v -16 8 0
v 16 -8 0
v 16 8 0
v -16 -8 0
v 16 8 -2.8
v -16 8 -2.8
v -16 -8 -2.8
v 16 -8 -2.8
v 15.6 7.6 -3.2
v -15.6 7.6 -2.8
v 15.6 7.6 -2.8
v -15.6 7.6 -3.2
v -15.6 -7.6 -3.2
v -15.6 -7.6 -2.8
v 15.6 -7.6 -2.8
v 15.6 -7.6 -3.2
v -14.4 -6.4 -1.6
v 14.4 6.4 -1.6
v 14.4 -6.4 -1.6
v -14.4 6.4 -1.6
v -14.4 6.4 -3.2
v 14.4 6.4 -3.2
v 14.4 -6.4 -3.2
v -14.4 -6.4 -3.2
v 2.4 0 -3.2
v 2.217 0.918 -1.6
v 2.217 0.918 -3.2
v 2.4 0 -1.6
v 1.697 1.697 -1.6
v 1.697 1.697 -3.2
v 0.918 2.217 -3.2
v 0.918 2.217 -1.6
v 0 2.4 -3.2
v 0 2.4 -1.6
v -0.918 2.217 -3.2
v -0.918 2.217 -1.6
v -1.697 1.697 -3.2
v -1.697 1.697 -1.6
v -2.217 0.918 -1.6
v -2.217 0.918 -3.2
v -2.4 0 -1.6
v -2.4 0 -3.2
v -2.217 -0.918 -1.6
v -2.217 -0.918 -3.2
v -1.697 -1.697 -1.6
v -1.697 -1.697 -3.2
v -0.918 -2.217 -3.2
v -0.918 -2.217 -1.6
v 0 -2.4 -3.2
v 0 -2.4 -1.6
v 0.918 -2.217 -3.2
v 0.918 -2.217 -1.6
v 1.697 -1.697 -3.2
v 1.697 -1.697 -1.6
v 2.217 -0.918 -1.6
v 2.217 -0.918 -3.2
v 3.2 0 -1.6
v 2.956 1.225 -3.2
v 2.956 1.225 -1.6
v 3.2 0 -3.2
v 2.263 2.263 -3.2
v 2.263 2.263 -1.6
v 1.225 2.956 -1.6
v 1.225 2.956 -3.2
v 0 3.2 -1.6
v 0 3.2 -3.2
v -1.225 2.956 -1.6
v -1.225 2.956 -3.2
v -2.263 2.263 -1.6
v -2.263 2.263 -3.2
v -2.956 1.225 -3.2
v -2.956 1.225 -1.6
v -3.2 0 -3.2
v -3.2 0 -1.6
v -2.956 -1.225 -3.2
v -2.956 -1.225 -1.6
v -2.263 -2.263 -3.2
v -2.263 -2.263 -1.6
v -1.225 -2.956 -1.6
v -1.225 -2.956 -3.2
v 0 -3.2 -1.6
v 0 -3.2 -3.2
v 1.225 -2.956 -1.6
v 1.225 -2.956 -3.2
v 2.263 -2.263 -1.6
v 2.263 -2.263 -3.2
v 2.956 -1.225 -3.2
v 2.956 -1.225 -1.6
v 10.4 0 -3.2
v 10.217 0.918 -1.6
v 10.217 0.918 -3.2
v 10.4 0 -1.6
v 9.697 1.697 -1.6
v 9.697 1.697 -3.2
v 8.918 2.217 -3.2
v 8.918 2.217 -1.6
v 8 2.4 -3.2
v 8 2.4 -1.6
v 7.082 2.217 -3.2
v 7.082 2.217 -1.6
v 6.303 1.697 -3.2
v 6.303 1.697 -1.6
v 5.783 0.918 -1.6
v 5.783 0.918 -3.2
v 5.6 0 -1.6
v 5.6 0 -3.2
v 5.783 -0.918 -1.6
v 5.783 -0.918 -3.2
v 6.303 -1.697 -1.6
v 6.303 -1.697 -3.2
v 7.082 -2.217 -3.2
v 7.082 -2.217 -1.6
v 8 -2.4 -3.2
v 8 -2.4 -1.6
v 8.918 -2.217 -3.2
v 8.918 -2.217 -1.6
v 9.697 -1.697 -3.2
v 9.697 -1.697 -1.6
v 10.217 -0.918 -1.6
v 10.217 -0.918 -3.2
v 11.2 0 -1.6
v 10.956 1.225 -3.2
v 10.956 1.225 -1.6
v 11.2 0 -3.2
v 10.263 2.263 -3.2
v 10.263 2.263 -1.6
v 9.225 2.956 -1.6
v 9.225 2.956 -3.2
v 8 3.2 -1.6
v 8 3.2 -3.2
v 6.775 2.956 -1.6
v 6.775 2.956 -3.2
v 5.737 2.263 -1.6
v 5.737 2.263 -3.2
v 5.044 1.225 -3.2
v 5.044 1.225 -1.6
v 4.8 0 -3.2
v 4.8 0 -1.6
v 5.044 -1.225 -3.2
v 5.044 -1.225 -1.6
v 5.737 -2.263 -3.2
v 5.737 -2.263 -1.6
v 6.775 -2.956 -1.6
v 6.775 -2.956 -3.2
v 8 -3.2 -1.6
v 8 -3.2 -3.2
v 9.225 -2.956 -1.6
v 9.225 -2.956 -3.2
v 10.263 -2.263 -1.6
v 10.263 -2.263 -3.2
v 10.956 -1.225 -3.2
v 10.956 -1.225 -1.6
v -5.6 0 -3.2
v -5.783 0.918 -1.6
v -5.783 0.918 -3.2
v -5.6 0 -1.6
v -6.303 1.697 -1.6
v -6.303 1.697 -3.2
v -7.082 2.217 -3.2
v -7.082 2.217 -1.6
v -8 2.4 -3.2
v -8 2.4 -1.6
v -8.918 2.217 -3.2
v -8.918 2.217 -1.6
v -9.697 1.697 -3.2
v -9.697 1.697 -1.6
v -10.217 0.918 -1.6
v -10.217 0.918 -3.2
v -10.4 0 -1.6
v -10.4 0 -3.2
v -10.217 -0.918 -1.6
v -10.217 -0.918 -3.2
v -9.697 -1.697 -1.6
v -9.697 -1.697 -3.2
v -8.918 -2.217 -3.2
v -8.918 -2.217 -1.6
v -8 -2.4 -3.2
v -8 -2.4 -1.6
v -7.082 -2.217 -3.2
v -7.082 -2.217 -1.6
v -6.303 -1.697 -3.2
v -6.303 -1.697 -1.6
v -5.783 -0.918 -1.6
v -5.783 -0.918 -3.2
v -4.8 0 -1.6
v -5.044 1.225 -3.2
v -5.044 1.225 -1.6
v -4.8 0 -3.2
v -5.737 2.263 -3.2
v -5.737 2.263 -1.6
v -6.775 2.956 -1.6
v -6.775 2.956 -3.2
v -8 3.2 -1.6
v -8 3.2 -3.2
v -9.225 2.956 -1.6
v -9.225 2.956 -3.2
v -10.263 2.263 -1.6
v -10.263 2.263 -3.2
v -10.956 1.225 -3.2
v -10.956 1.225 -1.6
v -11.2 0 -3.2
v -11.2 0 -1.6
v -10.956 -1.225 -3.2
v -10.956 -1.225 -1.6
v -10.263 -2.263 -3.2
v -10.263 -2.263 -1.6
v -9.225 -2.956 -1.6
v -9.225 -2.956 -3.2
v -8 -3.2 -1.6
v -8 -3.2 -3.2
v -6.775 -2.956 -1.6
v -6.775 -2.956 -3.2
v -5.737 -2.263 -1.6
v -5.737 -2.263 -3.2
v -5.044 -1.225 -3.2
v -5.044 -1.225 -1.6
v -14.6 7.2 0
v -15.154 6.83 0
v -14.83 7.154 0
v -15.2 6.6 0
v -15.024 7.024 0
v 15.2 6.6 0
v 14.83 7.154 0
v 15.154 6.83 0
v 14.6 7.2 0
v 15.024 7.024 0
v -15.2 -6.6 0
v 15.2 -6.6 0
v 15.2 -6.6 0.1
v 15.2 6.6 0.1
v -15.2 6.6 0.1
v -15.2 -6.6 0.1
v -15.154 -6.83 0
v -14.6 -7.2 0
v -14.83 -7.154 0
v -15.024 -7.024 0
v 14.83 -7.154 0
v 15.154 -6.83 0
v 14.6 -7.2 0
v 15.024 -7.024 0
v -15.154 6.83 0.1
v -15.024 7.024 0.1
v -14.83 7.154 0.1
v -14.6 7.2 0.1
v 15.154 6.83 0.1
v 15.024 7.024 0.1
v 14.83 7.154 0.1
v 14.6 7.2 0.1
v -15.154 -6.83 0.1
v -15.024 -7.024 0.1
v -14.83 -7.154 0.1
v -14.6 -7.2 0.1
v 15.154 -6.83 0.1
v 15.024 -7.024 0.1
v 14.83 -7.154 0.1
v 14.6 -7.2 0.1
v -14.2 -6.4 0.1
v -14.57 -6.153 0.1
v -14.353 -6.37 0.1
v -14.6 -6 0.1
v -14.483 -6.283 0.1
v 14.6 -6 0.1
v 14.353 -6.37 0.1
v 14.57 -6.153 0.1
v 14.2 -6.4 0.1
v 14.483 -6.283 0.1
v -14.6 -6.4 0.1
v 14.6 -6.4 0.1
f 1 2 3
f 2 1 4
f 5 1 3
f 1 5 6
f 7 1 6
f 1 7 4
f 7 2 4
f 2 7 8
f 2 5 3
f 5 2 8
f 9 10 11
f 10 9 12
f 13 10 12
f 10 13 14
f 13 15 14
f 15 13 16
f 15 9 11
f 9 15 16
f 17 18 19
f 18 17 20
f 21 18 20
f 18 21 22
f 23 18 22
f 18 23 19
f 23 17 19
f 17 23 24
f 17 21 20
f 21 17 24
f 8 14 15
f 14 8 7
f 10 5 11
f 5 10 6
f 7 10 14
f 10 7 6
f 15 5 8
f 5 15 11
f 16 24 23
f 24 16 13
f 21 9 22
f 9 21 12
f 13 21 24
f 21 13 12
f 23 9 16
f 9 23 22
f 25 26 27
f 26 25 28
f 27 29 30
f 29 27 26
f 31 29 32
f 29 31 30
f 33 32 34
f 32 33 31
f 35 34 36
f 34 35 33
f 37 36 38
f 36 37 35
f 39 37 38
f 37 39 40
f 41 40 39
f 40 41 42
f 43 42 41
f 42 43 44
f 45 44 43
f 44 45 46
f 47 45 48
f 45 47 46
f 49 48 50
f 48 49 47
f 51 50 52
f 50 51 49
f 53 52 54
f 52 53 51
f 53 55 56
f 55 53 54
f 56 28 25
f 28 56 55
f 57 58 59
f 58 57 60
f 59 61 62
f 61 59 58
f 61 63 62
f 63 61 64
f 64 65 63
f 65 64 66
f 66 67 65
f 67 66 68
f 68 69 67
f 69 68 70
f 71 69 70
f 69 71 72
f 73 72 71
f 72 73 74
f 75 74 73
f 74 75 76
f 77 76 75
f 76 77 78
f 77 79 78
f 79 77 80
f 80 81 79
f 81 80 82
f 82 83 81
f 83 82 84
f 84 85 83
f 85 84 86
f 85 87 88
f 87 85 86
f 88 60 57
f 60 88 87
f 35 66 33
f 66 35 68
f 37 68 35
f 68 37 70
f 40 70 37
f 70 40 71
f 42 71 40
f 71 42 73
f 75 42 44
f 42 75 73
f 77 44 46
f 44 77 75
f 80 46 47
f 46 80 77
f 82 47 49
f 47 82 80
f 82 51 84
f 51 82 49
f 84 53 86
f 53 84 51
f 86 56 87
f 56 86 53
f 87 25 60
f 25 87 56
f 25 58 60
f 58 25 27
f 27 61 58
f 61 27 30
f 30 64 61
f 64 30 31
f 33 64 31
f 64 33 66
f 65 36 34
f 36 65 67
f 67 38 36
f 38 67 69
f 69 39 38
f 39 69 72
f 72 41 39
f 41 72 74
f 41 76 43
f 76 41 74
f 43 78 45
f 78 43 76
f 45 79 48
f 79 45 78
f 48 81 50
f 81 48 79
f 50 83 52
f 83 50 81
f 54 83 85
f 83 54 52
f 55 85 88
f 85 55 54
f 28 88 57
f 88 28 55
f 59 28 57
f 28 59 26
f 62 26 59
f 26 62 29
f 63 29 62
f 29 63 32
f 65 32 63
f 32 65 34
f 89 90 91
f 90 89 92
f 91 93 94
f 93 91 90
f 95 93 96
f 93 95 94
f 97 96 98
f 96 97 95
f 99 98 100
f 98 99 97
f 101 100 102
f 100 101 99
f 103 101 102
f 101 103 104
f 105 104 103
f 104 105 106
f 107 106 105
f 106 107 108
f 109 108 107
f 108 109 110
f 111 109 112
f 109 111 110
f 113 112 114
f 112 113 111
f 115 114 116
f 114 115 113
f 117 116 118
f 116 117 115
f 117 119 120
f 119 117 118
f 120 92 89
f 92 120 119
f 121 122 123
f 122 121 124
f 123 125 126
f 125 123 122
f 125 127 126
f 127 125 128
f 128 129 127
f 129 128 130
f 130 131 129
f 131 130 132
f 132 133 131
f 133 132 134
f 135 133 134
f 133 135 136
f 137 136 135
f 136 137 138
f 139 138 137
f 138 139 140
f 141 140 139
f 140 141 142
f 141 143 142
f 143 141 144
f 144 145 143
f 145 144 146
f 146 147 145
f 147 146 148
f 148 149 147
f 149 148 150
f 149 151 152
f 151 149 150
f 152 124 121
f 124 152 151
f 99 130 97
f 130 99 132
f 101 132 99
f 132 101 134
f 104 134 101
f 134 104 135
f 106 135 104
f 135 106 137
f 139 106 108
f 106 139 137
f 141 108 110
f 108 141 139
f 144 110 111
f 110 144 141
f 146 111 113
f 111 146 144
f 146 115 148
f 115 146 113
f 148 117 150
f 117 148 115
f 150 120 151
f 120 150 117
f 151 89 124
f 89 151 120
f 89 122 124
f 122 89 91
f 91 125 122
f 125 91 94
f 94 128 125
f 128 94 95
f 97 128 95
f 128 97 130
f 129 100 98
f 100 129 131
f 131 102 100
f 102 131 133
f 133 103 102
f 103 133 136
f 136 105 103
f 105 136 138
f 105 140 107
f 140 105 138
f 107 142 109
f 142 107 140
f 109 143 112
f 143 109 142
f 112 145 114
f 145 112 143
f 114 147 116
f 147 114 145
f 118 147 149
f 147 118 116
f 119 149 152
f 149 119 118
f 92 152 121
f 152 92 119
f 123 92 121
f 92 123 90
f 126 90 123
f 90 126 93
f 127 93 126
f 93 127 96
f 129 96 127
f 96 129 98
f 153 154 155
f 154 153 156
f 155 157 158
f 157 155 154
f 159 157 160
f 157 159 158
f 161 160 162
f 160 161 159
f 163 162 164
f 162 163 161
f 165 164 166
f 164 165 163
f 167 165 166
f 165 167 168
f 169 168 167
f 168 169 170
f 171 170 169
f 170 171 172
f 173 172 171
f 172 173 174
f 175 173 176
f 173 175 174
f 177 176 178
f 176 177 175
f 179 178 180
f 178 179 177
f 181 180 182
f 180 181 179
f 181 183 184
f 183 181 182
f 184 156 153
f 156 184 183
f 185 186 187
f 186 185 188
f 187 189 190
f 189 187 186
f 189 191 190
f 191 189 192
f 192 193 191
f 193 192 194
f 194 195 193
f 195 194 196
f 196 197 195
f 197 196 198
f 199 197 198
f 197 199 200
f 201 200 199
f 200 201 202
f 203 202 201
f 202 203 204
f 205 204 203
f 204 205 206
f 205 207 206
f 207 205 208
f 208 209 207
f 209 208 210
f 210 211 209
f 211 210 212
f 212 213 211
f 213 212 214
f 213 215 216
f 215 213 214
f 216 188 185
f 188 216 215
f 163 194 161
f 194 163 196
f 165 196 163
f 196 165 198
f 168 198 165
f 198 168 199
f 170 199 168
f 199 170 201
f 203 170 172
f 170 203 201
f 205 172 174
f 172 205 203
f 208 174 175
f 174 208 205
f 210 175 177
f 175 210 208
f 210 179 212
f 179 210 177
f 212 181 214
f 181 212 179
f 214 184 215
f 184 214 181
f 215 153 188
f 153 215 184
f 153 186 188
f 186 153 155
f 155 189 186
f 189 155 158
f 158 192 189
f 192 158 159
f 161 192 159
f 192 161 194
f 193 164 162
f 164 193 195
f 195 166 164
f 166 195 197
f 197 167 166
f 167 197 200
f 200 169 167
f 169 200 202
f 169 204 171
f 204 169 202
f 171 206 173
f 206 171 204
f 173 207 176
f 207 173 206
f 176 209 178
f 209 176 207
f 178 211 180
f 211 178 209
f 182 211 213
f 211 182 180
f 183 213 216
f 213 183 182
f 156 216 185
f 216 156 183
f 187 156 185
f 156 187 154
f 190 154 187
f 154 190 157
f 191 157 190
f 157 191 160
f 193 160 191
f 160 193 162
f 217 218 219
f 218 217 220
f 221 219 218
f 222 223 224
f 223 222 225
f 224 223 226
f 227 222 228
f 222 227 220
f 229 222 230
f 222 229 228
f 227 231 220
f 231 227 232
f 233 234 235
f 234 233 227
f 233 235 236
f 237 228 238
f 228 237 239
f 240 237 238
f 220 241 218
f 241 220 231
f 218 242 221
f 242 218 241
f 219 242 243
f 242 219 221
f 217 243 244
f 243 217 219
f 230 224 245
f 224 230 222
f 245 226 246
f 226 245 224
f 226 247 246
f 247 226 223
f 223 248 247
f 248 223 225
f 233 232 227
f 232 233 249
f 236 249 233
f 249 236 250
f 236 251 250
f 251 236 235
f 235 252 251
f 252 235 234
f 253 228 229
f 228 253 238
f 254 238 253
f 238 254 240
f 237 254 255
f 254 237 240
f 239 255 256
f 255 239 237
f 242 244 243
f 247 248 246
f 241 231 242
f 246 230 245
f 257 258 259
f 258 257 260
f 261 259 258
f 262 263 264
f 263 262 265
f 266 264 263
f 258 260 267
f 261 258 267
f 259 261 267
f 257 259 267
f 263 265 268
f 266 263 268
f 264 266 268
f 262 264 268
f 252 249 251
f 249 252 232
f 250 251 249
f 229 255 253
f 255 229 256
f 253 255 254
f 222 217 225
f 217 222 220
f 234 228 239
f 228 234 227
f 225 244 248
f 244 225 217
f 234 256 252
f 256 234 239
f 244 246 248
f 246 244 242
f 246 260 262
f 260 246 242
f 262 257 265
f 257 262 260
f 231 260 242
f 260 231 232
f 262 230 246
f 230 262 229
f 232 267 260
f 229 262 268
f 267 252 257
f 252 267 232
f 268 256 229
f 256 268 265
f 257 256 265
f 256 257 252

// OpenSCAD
// file: ../p/4-4ring3.scad
use <../lib.scad>
$fa=1; $fs=0.2;
function ldraw_lib__4_4ring3(realsolid=false) = [
// 0 Ring  3 x 1.0
// 0 Name: 4-4ring3.dat
// 0 Author: James Jessiman
// 0 !LDRAW_ORG Primitive UPDATE 2009-01
// 0 !LICENSE Licensed under CC BY 2.0 and CC BY 4.0 : see CAreadme.txt
// 
// 0 BFC CERTIFY CCW
  [0,"BFC","CERTIFY"],
  [0,"BFC","CCW"],
// 
// 0 !HISTORY 1998-12-15 [PTadmin] Official Update 1998-10
// 0 !HISTORY 2002-04-05 [hafhead] Added BFC statement
// 0 !HISTORY 2002-04-25 [PTadmin] Official Update 2002-02
// 0 !HISTORY 2007-06-24 [PTadmin] Header formatted for Contributor Agreement
// 0 !HISTORY 2008-07-01 [PTadmin] Official Update 2008-01
// 0 !HISTORY 2008-08-26 [cwdee] Switch polygon winding and rename
// 0 !HISTORY 2009-05-02 [PTadmin] Official Update 2009-01
// 
// 
// 4 16 -1.5308 0 3.6956 -1.1481 0 2.7717 0 0 3 0 0 4
  [4,16,-1.5308,0,3.6956,-1.1481,0,2.7717,0,0,3,0,0,4],
// 4 16 -2.8284 0 2.8284 -2.1213 0 2.1213 -1.1481 0 2.7717 -1.5308 0 3.6956
  [4,16,-2.8284,0,2.8284,-2.1213,0,2.1213,-1.1481,0,2.7717,-1.5308,0,3.6956],
// 4 16 -3.6956 0 1.5308 -2.7717 0 1.1481 -2.1213 0 2.1213 -2.8284 0 2.8284
  [4,16,-3.6956,0,1.5308,-2.7717,0,1.1481,-2.1213,0,2.1213,-2.8284,0,2.8284],
// 4 16 -4 0 0 -3 0 0 -2.7717 0 1.1481 -3.6956 0 1.5308
  [4,16,-4,0,0,-3,0,0,-2.7717,0,1.1481,-3.6956,0,1.5308],
// 4 16 -3.6956 0 -1.5308 -2.7717 0 -1.1481 -3 0 0 -4 0 0
  [4,16,-3.6956,0,-1.5308,-2.7717,0,-1.1481,-3,0,0,-4,0,0],
// 4 16 -2.8284 0 -2.8284 -2.1213 0 -2.1213 -2.7717 0 -1.1481 -3.6956 0 -1.5308
  [4,16,-2.8284,0,-2.8284,-2.1213,0,-2.1213,-2.7717,0,-1.1481,-3.6956,0,-1.5308],
// 4 16 -1.5308 0 -3.6956 -1.1481 0 -2.7717 -2.1213 0 -2.1213 -2.8284 0 -2.8284
  [4,16,-1.5308,0,-3.6956,-1.1481,0,-2.7717,-2.1213,0,-2.1213,-2.8284,0,-2.8284],
// 4 16 0 0 -4 0 0 -3 -1.1481 0 -2.7717 -1.5308 0 -3.6956
  [4,16,0,0,-4,0,0,-3,-1.1481,0,-2.7717,-1.5308,0,-3.6956],
// 4 16 1.5308 0 -3.6956 1.1481 0 -2.7717 0 0 -3 0 0 -4
  [4,16,1.5308,0,-3.6956,1.1481,0,-2.7717,0,0,-3,0,0,-4],
// 4 16 2.8284 0 -2.8284 2.1213 0 -2.1213 1.1481 0 -2.7717 1.5308 0 -3.6956
  [4,16,2.8284,0,-2.8284,2.1213,0,-2.1213,1.1481,0,-2.7717,1.5308,0,-3.6956],
// 4 16 3.6956 0 -1.5308 2.7717 0 -1.1481 2.1213 0 -2.1213 2.8284 0 -2.8284
  [4,16,3.6956,0,-1.5308,2.7717,0,-1.1481,2.1213,0,-2.1213,2.8284,0,-2.8284],
// 4 16 4 0 0 3 0 0 2.7717 0 -1.1481 3.6956 0 -1.5308
  [4,16,4,0,0,3,0,0,2.7717,0,-1.1481,3.6956,0,-1.5308],
// 4 16 3.6956 0 1.5308 2.7717 0 1.1481 3 0 0 4 0 0
  [4,16,3.6956,0,1.5308,2.7717,0,1.1481,3,0,0,4,0,0],
// 4 16 2.8284 0 2.8284 2.1213 0 2.1213 2.7717 0 1.1481 3.6956 0 1.5308
  [4,16,2.8284,0,2.8284,2.1213,0,2.1213,2.7717,0,1.1481,3.6956,0,1.5308],
// 4 16 1.5308 0 3.6956 1.1481 0 2.7717 2.1213 0 2.1213 2.8284 0 2.8284
  [4,16,1.5308,0,3.6956,1.1481,0,2.7717,2.1213,0,2.1213,2.8284,0,2.8284],
// 4 16 0 0 4 0 0 3 1.1481 0 2.7717 1.5308 0 3.6956
  [4,16,0,0,4,0,0,3,1.1481,0,2.7717,1.5308,0,3.6956],
// 0
];
module ldraw_lib__4_4ring3(step=0, col=false, unit=2/5, alt=false, line=0.2, solid=!$preview)
    makepoly(ldraw_lib__4_4ring3(solid), step=step, col=col, unit=unit, alt=alt, line=line, solid=solid);
ldraw_lib__4_4ring3(line=0.2);
// file: ../p/4-4edge.scad
use <../lib.scad>
function ldraw_lib__4_4edge() = [
// 0 Circle 1.0
// 0 Name: 4-4edge.dat
// 0 Author: James Jessiman
// 0 !LDRAW_ORG Primitive UPDATE 2017-01
// 0 !LICENSE Licensed under CC BY 2.0 and CC BY 4.0 : see CAreadme.txt
// 
// 0 BFC CERTIFY CCW
  [0,"BFC","CERTIFY"],
  [0,"BFC","CCW"],
// 
// 0 !HISTORY 1998-12-15 [PTadmin] Official Update 1998-10
// 0 !HISTORY 2005-12-28 [PTadmin] Official Update 2005-01
// 0 !HISTORY 2007-06-24 [PTadmin] Header formatted for Contributor Agreement
// 0 !HISTORY 2008-07-01 [PTadmin] Official Update 2008-01
// 0 !HISTORY 2017-01-15 [Steffen] BFCed
// 0 !HISTORY 2017-12-30 [PTadmin] Official Update 2017-01
// 
// 
// 2 24 1 0 0 0.9239 0 0.3827
  [2,24,1,0,0,0.9239,0,0.3827],
// 2 24 0.9239 0 0.3827 0.7071 0 0.7071
  [2,24,0.9239,0,0.3827,0.7071,0,0.7071],
// 2 24 0.7071 0 0.7071 0.3827 0 0.9239
  [2,24,0.7071,0,0.7071,0.3827,0,0.9239],
// 2 24 0.3827 0 0.9239 0 0 1
  [2,24,0.3827,0,0.9239,0,0,1],
// 2 24 0 0 1 -0.3827 0 0.9239
  [2,24,0,0,1,-0.3827,0,0.9239],
// 2 24 -0.3827 0 0.9239 -0.7071 0 0.7071
  [2,24,-0.3827,0,0.9239,-0.7071,0,0.7071],
// 2 24 -0.7071 0 0.7071 -0.9239 0 0.3827
  [2,24,-0.7071,0,0.7071,-0.9239,0,0.3827],
// 2 24 -0.9239 0 0.3827 -1 0 -0
  [2,24,-0.9239,0,0.3827,-1,0,-0],
// 2 24 -1 0 -0 -0.9239 0 -0.3827
  [2,24,-1,0,-0,-0.9239,0,-0.3827],
// 2 24 -0.9239 0 -0.3827 -0.7071 0 -0.7071
  [2,24,-0.9239,0,-0.3827,-0.7071,0,-0.7071],
// 2 24 -0.7071 0 -0.7071 -0.3827 0 -0.9239
  [2,24,-0.7071,0,-0.7071,-0.3827,0,-0.9239],
// 2 24 -0.3827 0 -0.9239 0 0 -1
  [2,24,-0.3827,0,-0.9239,0,0,-1],
// 2 24 0 0 -1 0.3827 0 -0.9239
  [2,24,0,0,-1,0.3827,0,-0.9239],
// 2 24 0.3827 0 -0.9239 0.7071 0 -0.7071
  [2,24,0.3827,0,-0.9239,0.7071,0,-0.7071],
// 2 24 0.7071 0 -0.7071 0.9239 0 -0.3827
  [2,24,0.7071,0,-0.7071,0.9239,0,-0.3827],
// 2 24 0.9239 0 -0.3827 1 0 0
  [2,24,0.9239,0,-0.3827,1,0,0],
];
module ldraw_lib__4_4edge(step=0, col=false, unit=2/5, alt=false, line=0.2, solid=!$preview)
    makepoly(ldraw_lib__4_4edge(), step=step, col=col, unit=unit, alt=alt, line=line, solid=solid);
ldraw_lib__4_4edge(line=0.2);
// file: ../p/4-4cyli.scad
use <../lib.scad>
$fa=1; $fs=0.2;
function ldraw_lib__4_4cyli(realsolid=false) = [
// 0 Cylinder 1.0
// 0 Name: 4-4cyli.dat
// 0 Author: James Jessiman
// 0 !LDRAW_ORG Primitive UPDATE 2005-01
// 0 !LICENSE Licensed under CC BY 2.0 and CC BY 4.0 : see CAreadme.txt
// 
// 0 BFC CERTIFY CCW
  [0,"BFC","CERTIFY"],
  [0,"BFC","CCW"],
// 
// 0 !HISTORY 1998-12-15 [PTadmin] Official Update 1998-10
// 0 !HISTORY 2002-03-23 [sbliss] Added BFC statement; merged headers from files in distributions LDraw 0.27 and Complete.
// 0 !HISTORY 2002-04-25 [PTadmin] Official Update 2002-02
// 0 !HISTORY 2004-12-14 [guyvivan] BFC CCW
// 0 !HISTORY 2005-12-28 [PTadmin] Official Update 2005-01
// 0 !HISTORY 2007-06-24 [PTadmin] Header formatted for Contributor Agreement
// 0 !HISTORY 2008-07-01 [PTadmin] Official Update 2008-01
// 
// 
// 4 16 1 1 0 0.9239 1 0.3827 0.9239 0 0.3827 1 0 0
  [4,16,1,1,0,0.9239,1,0.3827,0.9239,0,0.3827,1,0,0],
// 5 24 1 0 0 1 1 0 0.9239 0 0.3827 0.9239 0 -0.3827
  [5,24,1,0,0,1,1,0,0.9239,0,0.3827,0.9239,0,-0.3827],
// 4 16 0.9239 1 0.3827 0.7071 1 0.7071 0.7071 0 0.7071 0.9239 0 0.3827
  [4,16,0.9239,1,0.3827,0.7071,1,0.7071,0.7071,0,0.7071,0.9239,0,0.3827],
// 5 24 0.9239 0 0.3827 0.9239 1 0.3827 0.7071 0 0.7071 1 0 0
  [5,24,0.9239,0,0.3827,0.9239,1,0.3827,0.7071,0,0.7071,1,0,0],
// 4 16 0.7071 1 0.7071 0.3827 1 0.9239 0.3827 0 0.9239 0.7071 0 0.7071
  [4,16,0.7071,1,0.7071,0.3827,1,0.9239,0.3827,0,0.9239,0.7071,0,0.7071],
// 5 24 0.7071 0 0.7071 0.7071 1 0.7071 0.3827 0 0.9239 0.9239 0 0.3827
  [5,24,0.7071,0,0.7071,0.7071,1,0.7071,0.3827,0,0.9239,0.9239,0,0.3827],
// 4 16 0.3827 1 0.9239 0 1 1 0 0 1 0.3827 0 0.9239
  [4,16,0.3827,1,0.9239,0,1,1,0,0,1,0.3827,0,0.9239],
// 5 24 0.3827 0 0.9239 0.3827 1 0.9239 0 0 1 0.7071 0 0.7071
  [5,24,0.3827,0,0.9239,0.3827,1,0.9239,0,0,1,0.7071,0,0.7071],
// 4 16 0 1 1 -0.3827 1 0.9239 -0.3827 0 0.9239 0 0 1
  [4,16,0,1,1,-0.3827,1,0.9239,-0.3827,0,0.9239,0,0,1],
// 5 24 0 0 1 0 1 1 -0.3827 0 0.9239 0.3827 0 0.9239
  [5,24,0,0,1,0,1,1,-0.3827,0,0.9239,0.3827,0,0.9239],
// 4 16 -0.3827 1 0.9239 -0.7071 1 0.7071 -0.7071 0 0.7071 -0.3827 0 0.9239
  [4,16,-0.3827,1,0.9239,-0.7071,1,0.7071,-0.7071,0,0.7071,-0.3827,0,0.9239],
// 5 24 -0.3827 0 0.9239 -0.3827 1 0.9239 -0.7071 0 0.7071 0 0 1
  [5,24,-0.3827,0,0.9239,-0.3827,1,0.9239,-0.7071,0,0.7071,0,0,1],
// 4 16 -0.7071 1 0.7071 -0.9239 1 0.3827 -0.9239 0 0.3827 -0.7071 0 0.7071
  [4,16,-0.7071,1,0.7071,-0.9239,1,0.3827,-0.9239,0,0.3827,-0.7071,0,0.7071],
// 5 24 -0.7071 0 0.7071 -0.7071 1 0.7071 -0.9239 0 0.3827 -0.3827 0 0.9239
  [5,24,-0.7071,0,0.7071,-0.7071,1,0.7071,-0.9239,0,0.3827,-0.3827,0,0.9239],
// 4 16 -0.9239 1 0.3827 -1 1 0 -1 0 0 -0.9239 0 0.3827
  [4,16,-0.9239,1,0.3827,-1,1,0,-1,0,0,-0.9239,0,0.3827],
// 5 24 -0.9239 0 0.3827 -0.9239 1 0.3827 -1 0 0 -0.7071 0 0.7071
  [5,24,-0.9239,0,0.3827,-0.9239,1,0.3827,-1,0,0,-0.7071,0,0.7071],
// 4 16 -1 1 0 -0.9239 1 -0.3827 -0.9239 0 -0.3827 -1 0 0
  [4,16,-1,1,0,-0.9239,1,-0.3827,-0.9239,0,-0.3827,-1,0,0],
// 5 24 -1 0 0 -1 1 0 -0.9239 0 -0.3827 -0.9239 0 0.3827
  [5,24,-1,0,0,-1,1,0,-0.9239,0,-0.3827,-0.9239,0,0.3827],
// 4 16 -0.9239 1 -0.3827 -0.7071 1 -0.7071 -0.7071 0 -0.7071 -0.9239 0 -0.3827
  [4,16,-0.9239,1,-0.3827,-0.7071,1,-0.7071,-0.7071,0,-0.7071,-0.9239,0,-0.3827],
// 5 24 -0.9239 0 -0.3827 -0.9239 1 -0.3827 -0.7071 0 -0.7071 -1 0 0
  [5,24,-0.9239,0,-0.3827,-0.9239,1,-0.3827,-0.7071,0,-0.7071,-1,0,0],
// 4 16 -0.7071 1 -0.7071 -0.3827 1 -0.9239 -0.3827 0 -0.9239 -0.7071 0 -0.7071
  [4,16,-0.7071,1,-0.7071,-0.3827,1,-0.9239,-0.3827,0,-0.9239,-0.7071,0,-0.7071],
// 5 24 -0.7071 0 -0.7071 -0.7071 1 -0.7071 -0.3827 0 -0.9239 -0.9239 0 -0.3827
  [5,24,-0.7071,0,-0.7071,-0.7071,1,-0.7071,-0.3827,0,-0.9239,-0.9239,0,-0.3827],
// 4 16 -0.3827 1 -0.9239 0 1 -1 0 0 -1 -0.3827 0 -0.9239
  [4,16,-0.3827,1,-0.9239,0,1,-1,0,0,-1,-0.3827,0,-0.9239],
// 5 24 -0.3827 0 -0.9239 -0.3827 1 -0.9239 0 0 -1 -0.7071 0 -0.7071
  [5,24,-0.3827,0,-0.9239,-0.3827,1,-0.9239,0,0,-1,-0.7071,0,-0.7071],
// 4 16 0 1 -1 0.3827 1 -0.9239 0.3827 0 -0.9239 0 0 -1
  [4,16,0,1,-1,0.3827,1,-0.9239,0.3827,0,-0.9239,0,0,-1],
// 5 24 0 0 -1 0 1 -1 0.3827 0 -0.9239 -0.3827 0 -0.9239
  [5,24,0,0,-1,0,1,-1,0.3827,0,-0.9239,-0.3827,0,-0.9239],
// 4 16 0.3827 1 -0.9239 0.7071 1 -0.7071 0.7071 0 -0.7071 0.3827 0 -0.9239
  [4,16,0.3827,1,-0.9239,0.7071,1,-0.7071,0.7071,0,-0.7071,0.3827,0,-0.9239],
// 5 24 0.3827 0 -0.9239 0.3827 1 -0.9239 0.7071 0 -0.7071 0 0 -1
  [5,24,0.3827,0,-0.9239,0.3827,1,-0.9239,0.7071,0,-0.7071,0,0,-1],
// 4 16 0.7071 1 -0.7071 0.9239 1 -0.3827 0.9239 0 -0.3827 0.7071 0 -0.7071
  [4,16,0.7071,1,-0.7071,0.9239,1,-0.3827,0.9239,0,-0.3827,0.7071,0,-0.7071],
// 5 24 0.7071 0 -0.7071 0.7071 1 -0.7071 0.9239 0 -0.3827 0.3827 0 -0.9239
  [5,24,0.7071,0,-0.7071,0.7071,1,-0.7071,0.9239,0,-0.3827,0.3827,0,-0.9239],
// 4 16 0.9239 1 -0.3827 1 1 0 1 0 0 0.9239 0 -0.3827
  [4,16,0.9239,1,-0.3827,1,1,0,1,0,0,0.9239,0,-0.3827],
// 5 24 0.9239 0 -0.3827 0.9239 1 -0.3827 1 0 0 0.7071 0 -0.7071
  [5,24,0.9239,0,-0.3827,0.9239,1,-0.3827,1,0,0,0.7071,0,-0.7071],
// 0
];
module ldraw_lib__4_4cyli(step=0, col=false, unit=2/5, alt=false, line=0.2, solid=!$preview)
    makepoly(ldraw_lib__4_4cyli(solid), step=step, col=col, unit=unit, alt=alt, line=line, solid=solid);
ldraw_lib__4_4cyli(line=0.2);
// file: ../p/stud4.scad
use <../lib.scad>
use <4-4cyli.scad>
use <4-4edge.scad>
use <4-4ring3.scad>
function ldraw_lib__stud4() = [
// 0 Stud Tube Open
// 0 Name: stud4.dat
// 0 Author: James Jessiman
// 0 !LDRAW_ORG Primitive UPDATE 2009-02
// 0 !LICENSE Licensed under CC BY 4.0 : see CAreadme.txt
// 
// 0 BFC CERTIFY CCW
  [0,"BFC","CERTIFY"],
  [0,"BFC","CCW"],
// 
// 0 !HISTORY 1999-07-05 [PTadmin] Official Update 1999-05
// 0 !HISTORY 2002-04-04 [sbliss] Modified for BFC compliance
// 0 !HISTORY 2002-04-25 [PTadmin] Official Update 2002-02
// 0 !HISTORY 2007-06-24 [PTadmin] Header formatted for Contributor Agreement
// 0 !HISTORY 2008-07-01 [PTadmin] Official Update 2008-01
// 0 !HISTORY 2009-06-21 [cwdee] Update ring references to 4-4ring
// 0 !HISTORY 2009-09-03 [PTadmin] Official Update 2009-02
// 
// 
// 1 16 0 -4 0 6 0 0 0 1 0 0 0 6 4-4edge.dat
  [1,16,0,-4,0,6,0,0,0,1,0,0,0,6, ldraw_lib__4_4edge()],
// 1 16 0 -4 0 8 0 0 0 1 0 0 0 8 4-4edge.dat
  [1,16,0,-4,0,8,0,0,0,1,0,0,0,8, ldraw_lib__4_4edge()],
// 1 16 0 0 0 6 0 0 0 1 0 0 0 6 4-4edge.dat
  [1,16,0,0,0,6,0,0,0,1,0,0,0,6, ldraw_lib__4_4edge()],
// 1 16 0 0 0 8 0 0 0 1 0 0 0 8 4-4edge.dat
  [1,16,0,0,0,8,0,0,0,1,0,0,0,8, ldraw_lib__4_4edge()],
// 0 BFC INVERTNEXT
  [0,"BFC","INVERTNEXT"],
// 1 16 0 -4 0 6 0 0 0 4 0 0 0 6 4-4cyli.dat
  [1,16,0,-4,0,6,0,0,0,4,0,0,0,6, ldraw_lib__4_4cyli()],
// 1 16 0 -4 0 8 0 0 0 4 0 0 0 8 4-4cyli.dat
  [1,16,0,-4,0,8,0,0,0,4,0,0,0,8, ldraw_lib__4_4cyli()],
// 1 16 0 -4 0 2 0 0 0 1 0 0 0 2 4-4ring3.dat
  [1,16,0,-4,0,2,0,0,0,1,0,0,0,2, ldraw_lib__4_4ring3()],
  [-1,16,0,0,0,2,0,0,0,-1,0,0,0,2, ldraw_lib__4_4ring3()],
// 0
];
module ldraw_lib__stud4(step=0, col=false, unit=2/5, alt=false, line=0.2, solid=!$preview)
    makepoly(ldraw_lib__stud4(), step=step, col=col, unit=unit, alt=alt, line=line, solid=solid);
ldraw_lib__stud4(line=0.2);
// file: ../p/box5.scad
use <../lib.scad>
function ldraw_lib__box5() = [
// 0 Box with 5 Faces and All Edges
// 0 Name: box5.dat
// 0 Author: James Jessiman
// 0 !LDRAW_ORG Primitive UPDATE 2012-01
// 0 !LICENSE Licensed under CC BY 2.0 and CC BY 4.0 : see CAreadme.txt
// 
// 0 BFC CERTIFY CCW
  [0,"BFC","CERTIFY"],
  [0,"BFC","CCW"],
// 
// 0 !HISTORY 2002-04-03 [sbliss] Modified for BFC compliance
// 0 !HISTORY 2002-04-25 [PTadmin] Official Update 2002-02
// 0 !HISTORY 2007-06-24 [PTadmin] Header formatted for Contributor Agreement
// 0 !HISTORY 2008-07-01 [PTadmin] Official Update 2008-01
// 0 !HISTORY 2012-02-16 [Philo] Changed to CCW
// 0 !HISTORY 2012-03-30 [PTadmin] Official Update 2012-01
// 
// 
// 2 24 1 1 1 -1 1 1
  [2,24,1,1,1,-1,1,1],
// 2 24 -1 1 1 -1 1 -1
  [2,24,-1,1,1,-1,1,-1],
// 2 24 -1 1 -1 1 1 -1
  [2,24,-1,1,-1,1,1,-1],
// 2 24 1 1 -1 1 1 1
  [2,24,1,1,-1,1,1,1],
// 2 24 1 0 1 -1 0 1
  [2,24,1,0,1,-1,0,1],
// 2 24 -1 0 1 -1 0 -1
  [2,24,-1,0,1,-1,0,-1],
// 2 24 -1 0 -1 1 0 -1
  [2,24,-1,0,-1,1,0,-1],
// 2 24 1 0 -1 1 0 1
  [2,24,1,0,-1,1,0,1],
// 2 24 1 0 1 1 1 1
  [2,24,1,0,1,1,1,1],
// 2 24 -1 0 1 -1 1 1
  [2,24,-1,0,1,-1,1,1],
// 2 24 1 0 -1 1 1 -1
  [2,24,1,0,-1,1,1,-1],
// 2 24 -1 0 -1 -1 1 -1
  [2,24,-1,0,-1,-1,1,-1],
// 4 16 -1 1 1 1 1 1 1 1 -1 -1 1 -1
  [4,16,-1,1,1,1,1,1,1,1,-1,-1,1,-1],
// 4 16 -1 1 1 -1 0 1 1 0 1 1 1 1
  [4,16,-1,1,1,-1,0,1,1,0,1,1,1,1],
// 4 16 -1 1 -1 -1 0 -1 -1 0 1 -1 1 1
  [4,16,-1,1,-1,-1,0,-1,-1,0,1,-1,1,1],
// 4 16 1 1 -1 1 0 -1 -1 0 -1 -1 1 -1
  [4,16,1,1,-1,1,0,-1,-1,0,-1,-1,1,-1],
// 4 16 1 1 1 1 0 1 1 0 -1 1 1 -1
  [4,16,1,1,1,1,0,1,1,0,-1,1,1,-1],
];
makepoly(ldraw_lib__box5(), line=0.2);
// file: ../p/box4.scad
use <../lib.scad>
function ldraw_lib__box4() = [
// 0 Box with 4 Faces (2 Parallel Pairs) and All Edges
// 0 Name: box4.dat
// 0 Author: James Jessiman
// 0 !LDRAW_ORG Primitive UPDATE 2012-01
// 0 !LICENSE Licensed under CC BY 4.0 : see CAreadme.txt
// 
// 0 BFC CERTIFY CCW
  [0,"BFC","CERTIFY"],
  [0,"BFC","CCW"],
// 
// 0 !HISTORY 2002-04-03 [sbliss] Modified for BFC compliance
// 0 !HISTORY 2002-04-25 [PTadmin] Official Update 2002-02
// 0 !HISTORY 2007-06-24 [PTadmin] Header formatted for Contributor Agreement
// 0 !HISTORY 2008-07-01 [PTadmin] Official Update 2008-01
// 0 !HISTORY 2012-02-16 [Philo] Changed to CCW
// 0 !HISTORY 2012-03-30 [PTadmin] Official Update 2012-01
// 
// 
// 2 24 1 1 1 -1 1 1
  [2,24,1,1,1,-1,1,1],
// 2 24 -1 1 1 -1 1 -1
  [2,24,-1,1,1,-1,1,-1],
// 2 24 -1 1 -1 1 1 -1
  [2,24,-1,1,-1,1,1,-1],
// 2 24 1 1 -1 1 1 1
  [2,24,1,1,-1,1,1,1],
// 2 24 1 0 1 -1 0 1
  [2,24,1,0,1,-1,0,1],
// 2 24 -1 0 1 -1 0 -1
  [2,24,-1,0,1,-1,0,-1],
// 2 24 -1 0 -1 1 0 -1
  [2,24,-1,0,-1,1,0,-1],
// 2 24 1 0 -1 1 0 1
  [2,24,1,0,-1,1,0,1],
// 2 24 1 0 1 1 1 1
  [2,24,1,0,1,1,1,1],
// 2 24 -1 0 1 -1 1 1
  [2,24,-1,0,1,-1,1,1],
// 2 24 1 0 -1 1 1 -1
  [2,24,1,0,-1,1,1,-1],
// 2 24 -1 0 -1 -1 1 -1
  [2,24,-1,0,-1,-1,1,-1],
// 4 16 -1 1 1 -1 0 1 1 0 1 1 1 1
  [4,16,-1,1,1,-1,0,1,1,0,1,1,1,1],
// 4 16 -1 1 -1 -1 0 -1 -1 0 1 -1 1 1
  [4,16,-1,1,-1,-1,0,-1,-1,0,1,-1,1,1],
// 4 16 1 1 -1 1 0 -1 -1 0 -1 -1 1 -1
  [4,16,1,1,-1,1,0,-1,-1,0,-1,-1,1,-1],
// 4 16 1 1 1 1 0 1 1 0 -1 1 1 -1
  [4,16,1,1,1,1,0,1,1,0,-1,1,1,-1],
];
module ldraw_lib__box4(step=0, col=false, unit=2/5, alt=false, line=0.2, solid=!$preview)
    makepoly(ldraw_lib__box4(), step=step, col=col, unit=unit, alt=alt, line=line, solid=solid);
ldraw_lib__box4(line=0.2);
// file: s/87079s01.scad
use <../../lib.scad>
use <../../p/box4.scad>
use <../../p/box5.scad>
use <../../p/stud4.scad>
function ldraw_lib__s__87079s01() = [
// 0 ~Tile  2 x  4 with Groove without Top
// 0 Name: s\87079s01.dat
// 0 Author: Philippe Hurbain [Philo]
// 0 !LDRAW_ORG Subpart UPDATE 2012-03
// 0 !LICENSE Licensed under CC BY 4.0 : see CAreadme.txt
// 
// 0 BFC CERTIFY CCW
  [0,"BFC","CERTIFY"],
  [0,"BFC","CCW"],
// 
// 0 !HISTORY 2012-09-30 [Philo] Subparted from Tim Gould's original design
// 0 !HISTORY 2012-12-28 [PTadmin] Official Update 2012-03
// 
// 
// 1 16 0 0 0 40 0 0 0 7 0 0 0 20 box4.dat
  [1,16,0,0,0,40,0,0,0,7,0,0,0,20, ldraw_lib__box4()],
// 1 16 0 7 0 39 0 0 0 1 0 0 0 19 box4.dat
  [1,16,0,7,0,39,0,0,0,1,0,0,0,19, ldraw_lib__box4()],
// 0 BFC INVERTNEXT
  [0,"BFC","INVERTNEXT"],
// 1 16 0 8 0 -36 0 0 0 -4 0 0 0 16 box5.dat
  [1,16,0,8,0,-36,0,0,0,-4,0,0,0,16, ldraw_lib__box5()],
// 4 16 -40 7 -20 -39 7 -19 39 7 -19 40 7 -20
  [4,16,-40,7,-20,-39,7,-19,39,7,-19,40,7,-20],
// 4 16 40 7 20 39 7 19 -39 7 19 -40 7 20
  [4,16,40,7,20,39,7,19,-39,7,19,-40,7,20],
// 4 16 -40 7 -20 -40 7 20 -39 7 19 -39 7 -19
  [4,16,-40,7,-20,-40,7,20,-39,7,19,-39,7,-19],
// 4 16 40 7 20 40 7 -20 39 7 -19 39 7 19
  [4,16,40,7,20,40,7,-20,39,7,-19,39,7,19],
// 4 16 -39 8 -19 -36 8 -16 36 8 -16 39 8 -19
  [4,16,-39,8,-19,-36,8,-16,36,8,-16,39,8,-19],
// 4 16 39 8 19 36 8 16 -36 8 16 -39 8 19
  [4,16,39,8,19,36,8,16,-36,8,16,-39,8,19],
// 4 16 -39 8 -19 -39 8 19 -36 8 16 -36 8 -16
  [4,16,-39,8,-19,-39,8,19,-36,8,16,-36,8,-16],
// 4 16 39 8 19 39 8 -19 36 8 -16 36 8 16
  [4,16,39,8,19,39,8,-19,36,8,-16,36,8,16],
// 1 16 0 4 0 1 0 0 0 -1 0 0 0 1 stud4.dat
  [1,16,0,4,0,1,0,0,0,-1,0,0,0,1, ldraw_lib__stud4()],
// 1 16 20 4 0 1 0 0 0 -1 0 0 0 1 stud4.dat
  [1,16,20,4,0,1,0,0,0,-1,0,0,0,1, ldraw_lib__stud4()],
// 1 16 -20 4 0 1 0 0 0 -1 0 0 0 1 stud4.dat
  [1,16,-20,4,0,1,0,0,0,-1,0,0,0,1, ldraw_lib__stud4()],
];
module ldraw_lib__s__87079s01(step=0, col=false, unit=2/5, alt=false, line=0.2, solid=!$preview)
    makepoly(ldraw_lib__s__87079s01(), step=step, col=col, unit=unit, alt=alt, line=line, solid=solid);
ldraw_lib__s__87079s01(line=0.2);
// file: ../p/box3u12.scad
use <../lib.scad>
function ldraw_lib__box3u12() = [
// 0 Box with 3 Parallel Faces without Any Edges
// 0 Name: box3u12.dat
// 0 Author: J.C. Tchang [tchang]
// 0 !LDRAW_ORG Primitive UPDATE 2014-02
// 0 !LICENSE Licensed under CC BY 2.0 and CC BY 4.0 : see CAreadme.txt
// 
// 0 BFC CERTIFY CCW
  [0,"BFC","CERTIFY"],
  [0,"BFC","CCW"],
// 
// 0 !HISTORY 2014-12-23 [PTadmin] Official Update 2014-02
// 
// 
// 4 16 -1 1 1 1 1 1 1 1 -1 -1 1 -1
  [4,16,-1,1,1,1,1,1,1,1,-1,-1,1,-1],
// 4 16 -1 1 1 -1 0 1 1 0 1 1 1 1
  [4,16,-1,1,1,-1,0,1,1,0,1,1,1,1],
// 4 16 1 1 -1 1 0 -1 -1 0 -1 -1 1 -1
  [4,16,1,1,-1,1,0,-1,-1,0,-1,-1,1,-1],
];
makepoly(ldraw_lib__box3u12(), line=0.2);
// file: ../p/1-8chrd.scad
use <../lib.scad>
$fa=1; $fs=0.2;
function ldraw_lib__1_8chrd(realsolid=false) = [
// 0 Chord 0.125
// 0 Name: 1-8chrd.dat
// 0 Author: Andy Westrate [westrate]
// 0 !LDRAW_ORG Primitive UPDATE 2004-02
// 0 !LICENSE Licensed under CC BY 2.0 and CC BY 4.0 : see CAreadme.txt
// 
// 0 BFC CERTIFY CCW
  [0,"BFC","CERTIFY"],
  [0,"BFC","CCW"],
// 
// 0 !HISTORY 2004-04-22 [PTadmin] Official Update 2004-02
// 0 !HISTORY 2007-06-22 [PTadmin] Header formatted for Contributor Agreement
// 0 !HISTORY 2008-07-01 [PTadmin] Official Update 2008-01
// 
// 
// 3 16 0.7071 0 0.7071 1 0 0 0.9239 0 0.3827
  [3,16,0.7071,0,0.7071,1,0,0,0.9239,0,0.3827],
// 
// 0
];
module ldraw_lib__1_8chrd(step=0, col=false, unit=2/5, alt=false, line=0.2, solid=!$preview)
    makepoly(ldraw_lib__1_8chrd(solid), step=step, col=col, unit=unit, alt=alt, line=line, solid=solid);
ldraw_lib__1_8chrd(line=0.2);
// file: ../p/1-4ndis.scad
use <../lib.scad>
function ldraw_lib__1_4ndis() = [
// 0 Disc Negative 0.25
// 0 Name: 1-4ndis.dat
// 0 Author: James Jessiman
// 0 !LDRAW_ORG Primitive UPDATE 2012-01
// 0 !LICENSE Licensed under CC BY 2.0 and CC BY 4.0 : see CAreadme.txt
// 
// 0 BFC CERTIFY CCW
  [0,"BFC","CERTIFY"],
  [0,"BFC","CCW"],
// 
// 0 !HISTORY 2002-03-23 [sbliss] Added BFC Statement
// 0 !HISTORY 2002-04-25 [PTadmin] Official Update 2002-02
// 0 !HISTORY 2007-06-22 [PTadmin] Header formatted for Contributor Agreement
// 0 !HISTORY 2008-07-01 [PTadmin] Official Update 2008-01
// 0 !HISTORY 2012-02-16 [Philo] Changed to CCW
// 0 !HISTORY 2012-03-30 [PTadmin] Official Update 2012-01
// 
// 
// 3 16 0.9239 0 0.3827 1 0 0 1 0 1
  [3,16,0.9239,0,0.3827,1,0,0,1,0,1],
// 3 16 0.7071 0 0.7071 0.9239 0 0.3827 1 0 1
  [3,16,0.7071,0,0.7071,0.9239,0,0.3827,1,0,1],
// 3 16 0.3827 0 0.9239 0.7071 0 0.7071 1 0 1
  [3,16,0.3827,0,0.9239,0.7071,0,0.7071,1,0,1],
// 3 16 0 0 1 0.3827 0 0.9239 1 0 1
  [3,16,0,0,1,0.3827,0,0.9239,1,0,1],
];
module ldraw_lib__1_4ndis(step=0, col=false, unit=2/5, alt=false, line=0.2, solid=!$preview)
    makepoly(ldraw_lib__1_4ndis(), step=step, col=col, unit=unit, alt=alt, line=line, solid=solid);
ldraw_lib__1_4ndis(line=0.2);
// file: ../p/1-4cyli.scad
use <../lib.scad>
function ldraw_lib__1_4cyli() = [
// 0 Cylinder 0.25
// 0 Name: 1-4cyli.dat
// 0 Author: James Jessiman
// 0 !LDRAW_ORG Primitive UPDATE 2012-01
// 0 !LICENSE Licensed under CC BY 2.0 and CC BY 4.0 : see CAreadme.txt
// 
// 0 BFC CERTIFY CCW
  [0,"BFC","CERTIFY"],
  [0,"BFC","CCW"],
// 
// 0 !HISTORY 2002-03-23 [sbliss] Added BFC statement.
// 0 !HISTORY 2002-04-25 [PTadmin] Official Update 2002-02
// 0 !HISTORY 2007-06-22 [PTadmin] Header formatted for Contributor Agreement
// 0 !HISTORY 2008-07-01 [PTadmin] Official Update 2008-01
// 0 !HISTORY 2012-02-16 [Philo] Changed to CCW
// 0 !HISTORY 2012-03-30 [PTadmin] Official Update 2012-01
// 
// 
// 4 16 1 1 0 0.9239 1 0.3827 0.9239 0 0.3827 1 0 0
  [4,16,1,1,0,0.9239,1,0.3827,0.9239,0,0.3827,1,0,0],
// 5 24 1 0 0 1 1 0 0.9239 0 0.3827 1 0 -1
  [5,24,1,0,0,1,1,0,0.9239,0,0.3827,1,0,-1],
// 4 16 0.9239 1 0.3827 0.7071 1 0.7071 0.7071 0 0.7071 0.9239 0 0.3827
  [4,16,0.9239,1,0.3827,0.7071,1,0.7071,0.7071,0,0.7071,0.9239,0,0.3827],
// 5 24 0.9239 0 0.3827 0.9239 1 0.3827 0.7071 0 0.7071 1 0 0
  [5,24,0.9239,0,0.3827,0.9239,1,0.3827,0.7071,0,0.7071,1,0,0],
// 4 16 0.7071 1 0.7071 0.3827 1 0.9239 0.3827 0 0.9239 0.7071 0 0.7071
  [4,16,0.7071,1,0.7071,0.3827,1,0.9239,0.3827,0,0.9239,0.7071,0,0.7071],
// 5 24 0.7071 0 0.7071 0.7071 1 0.7071 0.3827 0 0.9239 0.9239 0 0.3827
  [5,24,0.7071,0,0.7071,0.7071,1,0.7071,0.3827,0,0.9239,0.9239,0,0.3827],
// 4 16 0.3827 1 0.9239 0 1 1 0 0 1 0.3827 0 0.9239
  [4,16,0.3827,1,0.9239,0,1,1,0,0,1,0.3827,0,0.9239],
// 5 24 0.3827 0 0.9239 0.3827 1 0.9239 0 0 1 0.7071 0 0.7071
  [5,24,0.3827,0,0.9239,0.3827,1,0.9239,0,0,1,0.7071,0,0.7071],
// 5 24 0 0 1 0 1 1 0.3827 0 0.9239 -1 0 1
  [5,24,0,0,1,0,1,1,0.3827,0,0.9239,-1,0,1],
];
module ldraw_lib__1_4cyli(step=0, col=false, unit=2/5, alt=false, line=0.2, solid=!$preview)
    makepoly(ldraw_lib__1_4cyli(), step=step, col=col, unit=unit, alt=alt, line=line, solid=solid);
ldraw_lib__1_4cyli(line=0.2);
// file: ../p/1-4chrd.scad
use <../lib.scad>
$fa=1; $fs=0.2;
function ldraw_lib__1_4chrd(realsolid=false) = [
// 0 Chord 0.25
// 0 Name: 1-4chrd.dat
// 0 Author: Tony Hafner [hafhead]
// 0 !LDRAW_ORG Primitive UPDATE 2012-02
// 0 !LICENSE Licensed under CC BY 2.0 and CC BY 4.0 : see CAreadme.txt
// 
// 0 BFC CERTIFY CCW
  [0,"BFC","CERTIFY"],
  [0,"BFC","CCW"],
// 
// 0 !HISTORY 2004-04-22 [PTadmin] Official Update 2004-02
// 0 !HISTORY 2007-10-09 [PTadmin] Header formatted for Contributor Agreement
// 0 !HISTORY 2008-07-01 [PTadmin] Official Update 2008-01
// 0 !HISTORY 2012-08-02 [MMR1988] Re-creation with PrimGen2 and Rectifier
// 0 !HISTORY 2012-08-09 [PTadmin] Official Update 2012-02
// 
// 
// 4 16 0.9239 0 0.3827 0.3827 0 0.9239 0 0 1 1 0 0
  [4,16,0.9239,0,0.3827,0.3827,0,0.9239,0,0,1,1,0,0],
// 3 16 0.7071 0 0.7071 0.3827 0 0.9239 0.9239 0 0.3827
  [3,16,0.7071,0,0.7071,0.3827,0,0.9239,0.9239,0,0.3827],
];
module ldraw_lib__1_4chrd(step=0, col=false, unit=2/5, alt=false, line=0.2, solid=!$preview)
    makepoly(ldraw_lib__1_4chrd(solid), step=step, col=col, unit=unit, alt=alt, line=line, solid=solid);
ldraw_lib__1_4chrd(line=0.2);
// file: 87079.scad
use <../lib.scad>
use <s/87079s01.scad>
function ldraw_lib__87079() = [
// 0 Tile  2 x  4 with Groove
// 0 Name: 87079.dat
// 0 Author: Tim Gould [timgould]
// 0 !LDRAW_ORG Part UPDATE 2012-03
// 0 !LICENSE Licensed under CC BY 4.0 : see CAreadme.txt
// 
// 0 BFC CERTIFY CCW
  [0,"BFC","CERTIFY"],
  [0,"BFC","CCW"],
// 
// 0 !HISTORY 2010-04-05 [PTadmin] Official Update 2010-01
// 0 !HISTORY 2012-09-30 [Philo] Subparted for patterns
// 0 !HISTORY 2012-12-28 [PTadmin] Official Update 2012-03
// 
// 
// 4 16 -40 0 -20 40 0 -20 40 0 20 -40 0 20
  [4,16,-40,0,-20,40,0,-20,40,0,20,-40,0,20],
// 1 16 0 0 0 1 0 0 0 1 0 0 0 1 s\87079s01.dat
  [1,16,0,0,0,1,0,0,0,1,0,0,0,1, ldraw_lib__s__87079s01()],
];
module ldraw_lib__87079(step=0, col=false, unit=2/5, alt=false, line=0.2, solid=!$preview)
    makepoly(ldraw_lib__87079(), step=step, col=col, unit=unit, alt=alt, line=line, solid=solid);
ldraw_lib__87079(line=0.2);
// file: 6142622q.scad
use <../lib.scad>
use <../p/1-4chrd.scad>
use <../p/1-4cyli.scad>
use <../p/1-4ndis.scad>
use <../p/1-8chrd.scad>
use <../p/box3u12.scad>
function ldraw_lib__6142622q() = [
// 0 Sticker  1.8 x  3.8 with Black Trapezoid on Yellow Background
// 0 Name: 6142622q.dat
// 0 Author: Massimo Maso [Sirio]
// 0 !LDRAW_ORG Part UPDATE 2022-03
// 0 !LICENSE Licensed under CC BY 2.0 and CC BY 4.0 : see CAreadme.txt
// 
// 0 BFC CERTIFY CCW
  [0,"BFC","CERTIFY"],
  [0,"BFC","CCW"],
// 
// 0 !KEYWORDS Chevrolet, Corvette, Set 75870, Speed Champions
// 
// 0 !HISTORY 2022-05-07 [PTadmin] Official Update 2022-03
// 
// 
// 0 // Primitives
// 
// 1 16 -36.5 0 16.5 -1.5 0 0 0 -1 0 0 0 1.5 1-4chrd.dat
  [1,16,-36.5,0,16.5,-1.5,0,0,0,-1,0,0,0,1.5, ldraw_lib__1_4chrd()],
// 1 16 36.5 0 16.5 1.5 0 0 0 -1 0 0 0 1.5 1-4chrd.dat
  [1,16,36.5,0,16.5,1.5,0,0,0,-1,0,0,0,1.5, ldraw_lib__1_4chrd()],
// 1 16 0 -.25 0 0 0 38 0 .25 0 -16.5 0 0 box3u12.dat
  [1,16,0,-.25,0,0,0,38,0,.25,0,-16.5,0,0, ldraw_lib__box3u12()],
// 1 16 -36.5 0 -16.5 -1.5 0 0 0 -1 0 0 0 -1.5 1-4chrd.dat
  [1,16,-36.5,0,-16.5,-1.5,0,0,0,-1,0,0,0,-1.5, ldraw_lib__1_4chrd()],
// 1 16 36.5 0 -16.5 1.5 0 0 0 -1 0 0 0 -1.5 1-4chrd.dat
  [1,16,36.5,0,-16.5,1.5,0,0,0,-1,0,0,0,-1.5, ldraw_lib__1_4chrd()],
// 1 16 -36.5 0 16.5 -1.5 0 0 0 -.25 0 0 0 1.5 1-4cyli.dat
  [1,16,-36.5,0,16.5,-1.5,0,0,0,-.25,0,0,0,1.5, ldraw_lib__1_4cyli()],
// 1 16 36.5 0 16.5 1.5 0 0 0 -.25 0 0 0 1.5 1-4cyli.dat
  [1,16,36.5,0,16.5,1.5,0,0,0,-.25,0,0,0,1.5, ldraw_lib__1_4cyli()],
// 1 16 -36.5 0 -16.5 -1.5 0 0 0 -.25 0 0 0 -1.5 1-4cyli.dat
  [1,16,-36.5,0,-16.5,-1.5,0,0,0,-.25,0,0,0,-1.5, ldraw_lib__1_4cyli()],
// 1 16 36.5 0 -16.5 1.5 0 0 0 -.25 0 0 0 -1.5 1-4cyli.dat
  [1,16,36.5,0,-16.5,1.5,0,0,0,-.25,0,0,0,-1.5, ldraw_lib__1_4cyli()],
// 1 0 -36.5 -.25 16.5 0 0 -1.5 0 1 0 1.5 0 0 1-8chrd.dat
  [1,0,-36.5,-.25,16.5,0,0,-1.5,0,1,0,1.5,0,0, ldraw_lib__1_8chrd()],
// 1 0 36.5 -.25 16.5 0 0 1.5 0 1 0 1.5 0 0 1-8chrd.dat
  [1,0,36.5,-.25,16.5,0,0,1.5,0,1,0,1.5,0,0, ldraw_lib__1_8chrd()],
// 1 14 -36.5 -.25 16.5 -1.5 0 0 0 1 0 0 0 1.5 1-8chrd.dat
  [1,14,-36.5,-.25,16.5,-1.5,0,0,0,1,0,0,0,1.5, ldraw_lib__1_8chrd()],
// 1 14 36.5 -.25 16.5 1.5 0 0 0 1 0 0 0 1.5 1-8chrd.dat
  [1,14,36.5,-.25,16.5,1.5,0,0,0,1,0,0,0,1.5, ldraw_lib__1_8chrd()],
// 1 0 -35.5 -.25 -15 -1 0 0 0 1 0 0 0 -1 1-4chrd.dat
  [1,0,-35.5,-.25,-15,-1,0,0,0,1,0,0,0,-1, ldraw_lib__1_4chrd()],
// 1 0 35.5 -.25 -15 0 0 1 0 1 0 -1 0 0 1-4chrd.dat
  [1,0,35.5,-.25,-15,0,0,1,0,1,0,-1,0,0, ldraw_lib__1_4chrd()],
// 1 14 -35.5 -.25 -15 -1 0 0 0 1 0 0 0 -1 1-4ndis.dat
  [1,14,-35.5,-.25,-15,-1,0,0,0,1,0,0,0,-1, ldraw_lib__1_4ndis()],
// 1 14 35.5 -.25 -15 0 0 1 0 1 0 -1 0 0 1-4ndis.dat
  [1,14,35.5,-.25,-15,0,0,1,0,1,0,-1,0,0, ldraw_lib__1_4ndis()],
// 1 14 -36.5 -.25 -16.5 -1.5 0 0 0 1 0 0 0 -1.5 1-4chrd.dat
  [1,14,-36.5,-.25,-16.5,-1.5,0,0,0,1,0,0,0,-1.5, ldraw_lib__1_4chrd()],
// 1 14 36.5 -.25 -16.5 1.5 0 0 0 1 0 0 0 -1.5 1-4chrd.dat
  [1,14,36.5,-.25,-16.5,1.5,0,0,0,1,0,0,0,-1.5, ldraw_lib__1_4chrd()],
// 0 // Bottom face
// 4 16 36.5 0 18 38 0 16.5 -38 0 16.5 -36.5 0 18
  [4,16,36.5,0,18,38,0,16.5,-38,0,16.5,-36.5,0,18],
// 4 16 -38 0 -16.5 38 0 -16.5 36.5 0 -18 -36.5 0 -18
  [4,16,-38,0,-16.5,38,0,-16.5,36.5,0,-18,-36.5,0,-18],
// 0 // Lateral faces
// 4 16 -36.5 0 18 -36.5 -0.25 18 36.5 -0.25 18 36.5 0 18
  [4,16,-36.5,0,18,-36.5,-0.25,18,36.5,-0.25,18,36.5,0,18],
// 4 16 36.5 0 -18 36.5 -0.25 -18 -36.5 -0.25 -18 -36.5 0 -18
  [4,16,36.5,0,-18,36.5,-0.25,-18,-36.5,-0.25,-18,-36.5,0,-18],
// 0 // Top face
// 4 0 -36.5 -.25 18 -37.56065 -.25 17.56065 37.56065 -.25 17.56065 36.5 -.25 18
  [4,0,-36.5,-.25,18,-37.56065,-.25,17.56065,37.56065,-.25,17.56065,36.5,-.25,18],
// 4 0 -37.56065 -.25 17.56065 -36.5 -.25 -15 36.5 -.25 -15 37.56065 -.25 17.56065
  [4,0,-37.56065,-.25,17.56065,-36.5,-.25,-15,36.5,-.25,-15,37.56065,-.25,17.56065],
// 4 0 -36.5 -.25 -15 -35.5 -.25 -16 35.5 -.25 -16 36.5 -.25 -15
  [4,0,-36.5,-.25,-15,-35.5,-.25,-16,35.5,-.25,-16,36.5,-.25,-15],
// 4 14 -38 -.25 -16.5 -36.5 -.25 -15 -37.56065 -.25 17.56065 -38 -.25 16.5
  [4,14,-38,-.25,-16.5,-36.5,-.25,-15,-37.56065,-.25,17.56065,-38,-.25,16.5],
// 4 14 38 -.25 -16.5 38 -.25 16.5 37.56065 -.25 17.56065 36.5 -.25 -15
  [4,14,38,-.25,-16.5,38,-.25,16.5,37.56065,-.25,17.56065,36.5,-.25,-15],
// 3 14 -38 -.25 -16.5 -36.5 -.25 -16 -36.5 -.25 -15
  [3,14,-38,-.25,-16.5,-36.5,-.25,-16,-36.5,-.25,-15],
// 3 14 38 -.25 -16.5 36.5 -.25 -15 36.5 -.25 -16
  [3,14,38,-.25,-16.5,36.5,-.25,-15,36.5,-.25,-16],
// 4 14 -36.5 -.25 -18 -35.5 -.25 -16 -36.5 -.25 -16 -38 -.25 -16.5
  [4,14,-36.5,-.25,-18,-35.5,-.25,-16,-36.5,-.25,-16,-38,-.25,-16.5],
// 4 14 36.5 -.25 -16 35.5 -.25 -16 36.5 -.25 -18 38 -.25 -16.5
  [4,14,36.5,-.25,-16,35.5,-.25,-16,36.5,-.25,-18,38,-.25,-16.5],
// 4 14 -36.5 -.25 -18 36.5 -.25 -18 35.5 -.25 -16 -35.5 -.25 -16
  [4,14,-36.5,-.25,-18,36.5,-.25,-18,35.5,-.25,-16,-35.5,-.25,-16],
];
makepoly(ldraw_lib__6142622q(), line=0.2);
// main file
use <../lib.scad>
use <6142622q.scad>
use <87079.scad>
function ldraw_lib__87079d1o() = [
// 0 Tile  2 x  4 with Black Trapezoid on Yellow Background Sticker
// 0 Name: 87079d1o.dat
// 0 Author: Alfred Schmitz [AlfredS]
// 0 !LDRAW_ORG Shortcut UPDATE 2026-08
// 0 !LICENSE Licensed under CC BY 4.0 : see CAreadme.txt
// 
// 0 BFC CERTIFY CCW
  [0,"BFC","CERTIFY"],
  [0,"BFC","CCW"],
// 
// 0 !CATEGORY Sticker Shortcut
// 0 !KEYWORDS Chevrolet, Corvette, Set 75870, Speed Champions, Z06
// 
// 0 !HISTORY 2026-08-31 [OrionP] Official Update 2026-08
// 
// 1 16 0 0 0 1 0 0 0 1 0 0 0 1 87079.dat
  [1,16,0,0,0,1,0,0,0,1,0,0,0,1, ldraw_lib__87079()],
// 1 16 0 0 0 1 0 0 0 1 0 0 0 1 6142622q.dat
  [1,16,0,0,0,1,0,0,0,1,0,0,0,1, ldraw_lib__6142622q()],
];
module ldraw_lib__87079d1o(step=0, col=false, unit=2/5, alt=false, line=0.2, solid=!$preview)
    makepoly(ldraw_lib__87079d1o(), step=step, col=col, unit=unit, alt=alt, line=line, solid=solid);
ldraw_lib__87079d1o(line=0.2);
